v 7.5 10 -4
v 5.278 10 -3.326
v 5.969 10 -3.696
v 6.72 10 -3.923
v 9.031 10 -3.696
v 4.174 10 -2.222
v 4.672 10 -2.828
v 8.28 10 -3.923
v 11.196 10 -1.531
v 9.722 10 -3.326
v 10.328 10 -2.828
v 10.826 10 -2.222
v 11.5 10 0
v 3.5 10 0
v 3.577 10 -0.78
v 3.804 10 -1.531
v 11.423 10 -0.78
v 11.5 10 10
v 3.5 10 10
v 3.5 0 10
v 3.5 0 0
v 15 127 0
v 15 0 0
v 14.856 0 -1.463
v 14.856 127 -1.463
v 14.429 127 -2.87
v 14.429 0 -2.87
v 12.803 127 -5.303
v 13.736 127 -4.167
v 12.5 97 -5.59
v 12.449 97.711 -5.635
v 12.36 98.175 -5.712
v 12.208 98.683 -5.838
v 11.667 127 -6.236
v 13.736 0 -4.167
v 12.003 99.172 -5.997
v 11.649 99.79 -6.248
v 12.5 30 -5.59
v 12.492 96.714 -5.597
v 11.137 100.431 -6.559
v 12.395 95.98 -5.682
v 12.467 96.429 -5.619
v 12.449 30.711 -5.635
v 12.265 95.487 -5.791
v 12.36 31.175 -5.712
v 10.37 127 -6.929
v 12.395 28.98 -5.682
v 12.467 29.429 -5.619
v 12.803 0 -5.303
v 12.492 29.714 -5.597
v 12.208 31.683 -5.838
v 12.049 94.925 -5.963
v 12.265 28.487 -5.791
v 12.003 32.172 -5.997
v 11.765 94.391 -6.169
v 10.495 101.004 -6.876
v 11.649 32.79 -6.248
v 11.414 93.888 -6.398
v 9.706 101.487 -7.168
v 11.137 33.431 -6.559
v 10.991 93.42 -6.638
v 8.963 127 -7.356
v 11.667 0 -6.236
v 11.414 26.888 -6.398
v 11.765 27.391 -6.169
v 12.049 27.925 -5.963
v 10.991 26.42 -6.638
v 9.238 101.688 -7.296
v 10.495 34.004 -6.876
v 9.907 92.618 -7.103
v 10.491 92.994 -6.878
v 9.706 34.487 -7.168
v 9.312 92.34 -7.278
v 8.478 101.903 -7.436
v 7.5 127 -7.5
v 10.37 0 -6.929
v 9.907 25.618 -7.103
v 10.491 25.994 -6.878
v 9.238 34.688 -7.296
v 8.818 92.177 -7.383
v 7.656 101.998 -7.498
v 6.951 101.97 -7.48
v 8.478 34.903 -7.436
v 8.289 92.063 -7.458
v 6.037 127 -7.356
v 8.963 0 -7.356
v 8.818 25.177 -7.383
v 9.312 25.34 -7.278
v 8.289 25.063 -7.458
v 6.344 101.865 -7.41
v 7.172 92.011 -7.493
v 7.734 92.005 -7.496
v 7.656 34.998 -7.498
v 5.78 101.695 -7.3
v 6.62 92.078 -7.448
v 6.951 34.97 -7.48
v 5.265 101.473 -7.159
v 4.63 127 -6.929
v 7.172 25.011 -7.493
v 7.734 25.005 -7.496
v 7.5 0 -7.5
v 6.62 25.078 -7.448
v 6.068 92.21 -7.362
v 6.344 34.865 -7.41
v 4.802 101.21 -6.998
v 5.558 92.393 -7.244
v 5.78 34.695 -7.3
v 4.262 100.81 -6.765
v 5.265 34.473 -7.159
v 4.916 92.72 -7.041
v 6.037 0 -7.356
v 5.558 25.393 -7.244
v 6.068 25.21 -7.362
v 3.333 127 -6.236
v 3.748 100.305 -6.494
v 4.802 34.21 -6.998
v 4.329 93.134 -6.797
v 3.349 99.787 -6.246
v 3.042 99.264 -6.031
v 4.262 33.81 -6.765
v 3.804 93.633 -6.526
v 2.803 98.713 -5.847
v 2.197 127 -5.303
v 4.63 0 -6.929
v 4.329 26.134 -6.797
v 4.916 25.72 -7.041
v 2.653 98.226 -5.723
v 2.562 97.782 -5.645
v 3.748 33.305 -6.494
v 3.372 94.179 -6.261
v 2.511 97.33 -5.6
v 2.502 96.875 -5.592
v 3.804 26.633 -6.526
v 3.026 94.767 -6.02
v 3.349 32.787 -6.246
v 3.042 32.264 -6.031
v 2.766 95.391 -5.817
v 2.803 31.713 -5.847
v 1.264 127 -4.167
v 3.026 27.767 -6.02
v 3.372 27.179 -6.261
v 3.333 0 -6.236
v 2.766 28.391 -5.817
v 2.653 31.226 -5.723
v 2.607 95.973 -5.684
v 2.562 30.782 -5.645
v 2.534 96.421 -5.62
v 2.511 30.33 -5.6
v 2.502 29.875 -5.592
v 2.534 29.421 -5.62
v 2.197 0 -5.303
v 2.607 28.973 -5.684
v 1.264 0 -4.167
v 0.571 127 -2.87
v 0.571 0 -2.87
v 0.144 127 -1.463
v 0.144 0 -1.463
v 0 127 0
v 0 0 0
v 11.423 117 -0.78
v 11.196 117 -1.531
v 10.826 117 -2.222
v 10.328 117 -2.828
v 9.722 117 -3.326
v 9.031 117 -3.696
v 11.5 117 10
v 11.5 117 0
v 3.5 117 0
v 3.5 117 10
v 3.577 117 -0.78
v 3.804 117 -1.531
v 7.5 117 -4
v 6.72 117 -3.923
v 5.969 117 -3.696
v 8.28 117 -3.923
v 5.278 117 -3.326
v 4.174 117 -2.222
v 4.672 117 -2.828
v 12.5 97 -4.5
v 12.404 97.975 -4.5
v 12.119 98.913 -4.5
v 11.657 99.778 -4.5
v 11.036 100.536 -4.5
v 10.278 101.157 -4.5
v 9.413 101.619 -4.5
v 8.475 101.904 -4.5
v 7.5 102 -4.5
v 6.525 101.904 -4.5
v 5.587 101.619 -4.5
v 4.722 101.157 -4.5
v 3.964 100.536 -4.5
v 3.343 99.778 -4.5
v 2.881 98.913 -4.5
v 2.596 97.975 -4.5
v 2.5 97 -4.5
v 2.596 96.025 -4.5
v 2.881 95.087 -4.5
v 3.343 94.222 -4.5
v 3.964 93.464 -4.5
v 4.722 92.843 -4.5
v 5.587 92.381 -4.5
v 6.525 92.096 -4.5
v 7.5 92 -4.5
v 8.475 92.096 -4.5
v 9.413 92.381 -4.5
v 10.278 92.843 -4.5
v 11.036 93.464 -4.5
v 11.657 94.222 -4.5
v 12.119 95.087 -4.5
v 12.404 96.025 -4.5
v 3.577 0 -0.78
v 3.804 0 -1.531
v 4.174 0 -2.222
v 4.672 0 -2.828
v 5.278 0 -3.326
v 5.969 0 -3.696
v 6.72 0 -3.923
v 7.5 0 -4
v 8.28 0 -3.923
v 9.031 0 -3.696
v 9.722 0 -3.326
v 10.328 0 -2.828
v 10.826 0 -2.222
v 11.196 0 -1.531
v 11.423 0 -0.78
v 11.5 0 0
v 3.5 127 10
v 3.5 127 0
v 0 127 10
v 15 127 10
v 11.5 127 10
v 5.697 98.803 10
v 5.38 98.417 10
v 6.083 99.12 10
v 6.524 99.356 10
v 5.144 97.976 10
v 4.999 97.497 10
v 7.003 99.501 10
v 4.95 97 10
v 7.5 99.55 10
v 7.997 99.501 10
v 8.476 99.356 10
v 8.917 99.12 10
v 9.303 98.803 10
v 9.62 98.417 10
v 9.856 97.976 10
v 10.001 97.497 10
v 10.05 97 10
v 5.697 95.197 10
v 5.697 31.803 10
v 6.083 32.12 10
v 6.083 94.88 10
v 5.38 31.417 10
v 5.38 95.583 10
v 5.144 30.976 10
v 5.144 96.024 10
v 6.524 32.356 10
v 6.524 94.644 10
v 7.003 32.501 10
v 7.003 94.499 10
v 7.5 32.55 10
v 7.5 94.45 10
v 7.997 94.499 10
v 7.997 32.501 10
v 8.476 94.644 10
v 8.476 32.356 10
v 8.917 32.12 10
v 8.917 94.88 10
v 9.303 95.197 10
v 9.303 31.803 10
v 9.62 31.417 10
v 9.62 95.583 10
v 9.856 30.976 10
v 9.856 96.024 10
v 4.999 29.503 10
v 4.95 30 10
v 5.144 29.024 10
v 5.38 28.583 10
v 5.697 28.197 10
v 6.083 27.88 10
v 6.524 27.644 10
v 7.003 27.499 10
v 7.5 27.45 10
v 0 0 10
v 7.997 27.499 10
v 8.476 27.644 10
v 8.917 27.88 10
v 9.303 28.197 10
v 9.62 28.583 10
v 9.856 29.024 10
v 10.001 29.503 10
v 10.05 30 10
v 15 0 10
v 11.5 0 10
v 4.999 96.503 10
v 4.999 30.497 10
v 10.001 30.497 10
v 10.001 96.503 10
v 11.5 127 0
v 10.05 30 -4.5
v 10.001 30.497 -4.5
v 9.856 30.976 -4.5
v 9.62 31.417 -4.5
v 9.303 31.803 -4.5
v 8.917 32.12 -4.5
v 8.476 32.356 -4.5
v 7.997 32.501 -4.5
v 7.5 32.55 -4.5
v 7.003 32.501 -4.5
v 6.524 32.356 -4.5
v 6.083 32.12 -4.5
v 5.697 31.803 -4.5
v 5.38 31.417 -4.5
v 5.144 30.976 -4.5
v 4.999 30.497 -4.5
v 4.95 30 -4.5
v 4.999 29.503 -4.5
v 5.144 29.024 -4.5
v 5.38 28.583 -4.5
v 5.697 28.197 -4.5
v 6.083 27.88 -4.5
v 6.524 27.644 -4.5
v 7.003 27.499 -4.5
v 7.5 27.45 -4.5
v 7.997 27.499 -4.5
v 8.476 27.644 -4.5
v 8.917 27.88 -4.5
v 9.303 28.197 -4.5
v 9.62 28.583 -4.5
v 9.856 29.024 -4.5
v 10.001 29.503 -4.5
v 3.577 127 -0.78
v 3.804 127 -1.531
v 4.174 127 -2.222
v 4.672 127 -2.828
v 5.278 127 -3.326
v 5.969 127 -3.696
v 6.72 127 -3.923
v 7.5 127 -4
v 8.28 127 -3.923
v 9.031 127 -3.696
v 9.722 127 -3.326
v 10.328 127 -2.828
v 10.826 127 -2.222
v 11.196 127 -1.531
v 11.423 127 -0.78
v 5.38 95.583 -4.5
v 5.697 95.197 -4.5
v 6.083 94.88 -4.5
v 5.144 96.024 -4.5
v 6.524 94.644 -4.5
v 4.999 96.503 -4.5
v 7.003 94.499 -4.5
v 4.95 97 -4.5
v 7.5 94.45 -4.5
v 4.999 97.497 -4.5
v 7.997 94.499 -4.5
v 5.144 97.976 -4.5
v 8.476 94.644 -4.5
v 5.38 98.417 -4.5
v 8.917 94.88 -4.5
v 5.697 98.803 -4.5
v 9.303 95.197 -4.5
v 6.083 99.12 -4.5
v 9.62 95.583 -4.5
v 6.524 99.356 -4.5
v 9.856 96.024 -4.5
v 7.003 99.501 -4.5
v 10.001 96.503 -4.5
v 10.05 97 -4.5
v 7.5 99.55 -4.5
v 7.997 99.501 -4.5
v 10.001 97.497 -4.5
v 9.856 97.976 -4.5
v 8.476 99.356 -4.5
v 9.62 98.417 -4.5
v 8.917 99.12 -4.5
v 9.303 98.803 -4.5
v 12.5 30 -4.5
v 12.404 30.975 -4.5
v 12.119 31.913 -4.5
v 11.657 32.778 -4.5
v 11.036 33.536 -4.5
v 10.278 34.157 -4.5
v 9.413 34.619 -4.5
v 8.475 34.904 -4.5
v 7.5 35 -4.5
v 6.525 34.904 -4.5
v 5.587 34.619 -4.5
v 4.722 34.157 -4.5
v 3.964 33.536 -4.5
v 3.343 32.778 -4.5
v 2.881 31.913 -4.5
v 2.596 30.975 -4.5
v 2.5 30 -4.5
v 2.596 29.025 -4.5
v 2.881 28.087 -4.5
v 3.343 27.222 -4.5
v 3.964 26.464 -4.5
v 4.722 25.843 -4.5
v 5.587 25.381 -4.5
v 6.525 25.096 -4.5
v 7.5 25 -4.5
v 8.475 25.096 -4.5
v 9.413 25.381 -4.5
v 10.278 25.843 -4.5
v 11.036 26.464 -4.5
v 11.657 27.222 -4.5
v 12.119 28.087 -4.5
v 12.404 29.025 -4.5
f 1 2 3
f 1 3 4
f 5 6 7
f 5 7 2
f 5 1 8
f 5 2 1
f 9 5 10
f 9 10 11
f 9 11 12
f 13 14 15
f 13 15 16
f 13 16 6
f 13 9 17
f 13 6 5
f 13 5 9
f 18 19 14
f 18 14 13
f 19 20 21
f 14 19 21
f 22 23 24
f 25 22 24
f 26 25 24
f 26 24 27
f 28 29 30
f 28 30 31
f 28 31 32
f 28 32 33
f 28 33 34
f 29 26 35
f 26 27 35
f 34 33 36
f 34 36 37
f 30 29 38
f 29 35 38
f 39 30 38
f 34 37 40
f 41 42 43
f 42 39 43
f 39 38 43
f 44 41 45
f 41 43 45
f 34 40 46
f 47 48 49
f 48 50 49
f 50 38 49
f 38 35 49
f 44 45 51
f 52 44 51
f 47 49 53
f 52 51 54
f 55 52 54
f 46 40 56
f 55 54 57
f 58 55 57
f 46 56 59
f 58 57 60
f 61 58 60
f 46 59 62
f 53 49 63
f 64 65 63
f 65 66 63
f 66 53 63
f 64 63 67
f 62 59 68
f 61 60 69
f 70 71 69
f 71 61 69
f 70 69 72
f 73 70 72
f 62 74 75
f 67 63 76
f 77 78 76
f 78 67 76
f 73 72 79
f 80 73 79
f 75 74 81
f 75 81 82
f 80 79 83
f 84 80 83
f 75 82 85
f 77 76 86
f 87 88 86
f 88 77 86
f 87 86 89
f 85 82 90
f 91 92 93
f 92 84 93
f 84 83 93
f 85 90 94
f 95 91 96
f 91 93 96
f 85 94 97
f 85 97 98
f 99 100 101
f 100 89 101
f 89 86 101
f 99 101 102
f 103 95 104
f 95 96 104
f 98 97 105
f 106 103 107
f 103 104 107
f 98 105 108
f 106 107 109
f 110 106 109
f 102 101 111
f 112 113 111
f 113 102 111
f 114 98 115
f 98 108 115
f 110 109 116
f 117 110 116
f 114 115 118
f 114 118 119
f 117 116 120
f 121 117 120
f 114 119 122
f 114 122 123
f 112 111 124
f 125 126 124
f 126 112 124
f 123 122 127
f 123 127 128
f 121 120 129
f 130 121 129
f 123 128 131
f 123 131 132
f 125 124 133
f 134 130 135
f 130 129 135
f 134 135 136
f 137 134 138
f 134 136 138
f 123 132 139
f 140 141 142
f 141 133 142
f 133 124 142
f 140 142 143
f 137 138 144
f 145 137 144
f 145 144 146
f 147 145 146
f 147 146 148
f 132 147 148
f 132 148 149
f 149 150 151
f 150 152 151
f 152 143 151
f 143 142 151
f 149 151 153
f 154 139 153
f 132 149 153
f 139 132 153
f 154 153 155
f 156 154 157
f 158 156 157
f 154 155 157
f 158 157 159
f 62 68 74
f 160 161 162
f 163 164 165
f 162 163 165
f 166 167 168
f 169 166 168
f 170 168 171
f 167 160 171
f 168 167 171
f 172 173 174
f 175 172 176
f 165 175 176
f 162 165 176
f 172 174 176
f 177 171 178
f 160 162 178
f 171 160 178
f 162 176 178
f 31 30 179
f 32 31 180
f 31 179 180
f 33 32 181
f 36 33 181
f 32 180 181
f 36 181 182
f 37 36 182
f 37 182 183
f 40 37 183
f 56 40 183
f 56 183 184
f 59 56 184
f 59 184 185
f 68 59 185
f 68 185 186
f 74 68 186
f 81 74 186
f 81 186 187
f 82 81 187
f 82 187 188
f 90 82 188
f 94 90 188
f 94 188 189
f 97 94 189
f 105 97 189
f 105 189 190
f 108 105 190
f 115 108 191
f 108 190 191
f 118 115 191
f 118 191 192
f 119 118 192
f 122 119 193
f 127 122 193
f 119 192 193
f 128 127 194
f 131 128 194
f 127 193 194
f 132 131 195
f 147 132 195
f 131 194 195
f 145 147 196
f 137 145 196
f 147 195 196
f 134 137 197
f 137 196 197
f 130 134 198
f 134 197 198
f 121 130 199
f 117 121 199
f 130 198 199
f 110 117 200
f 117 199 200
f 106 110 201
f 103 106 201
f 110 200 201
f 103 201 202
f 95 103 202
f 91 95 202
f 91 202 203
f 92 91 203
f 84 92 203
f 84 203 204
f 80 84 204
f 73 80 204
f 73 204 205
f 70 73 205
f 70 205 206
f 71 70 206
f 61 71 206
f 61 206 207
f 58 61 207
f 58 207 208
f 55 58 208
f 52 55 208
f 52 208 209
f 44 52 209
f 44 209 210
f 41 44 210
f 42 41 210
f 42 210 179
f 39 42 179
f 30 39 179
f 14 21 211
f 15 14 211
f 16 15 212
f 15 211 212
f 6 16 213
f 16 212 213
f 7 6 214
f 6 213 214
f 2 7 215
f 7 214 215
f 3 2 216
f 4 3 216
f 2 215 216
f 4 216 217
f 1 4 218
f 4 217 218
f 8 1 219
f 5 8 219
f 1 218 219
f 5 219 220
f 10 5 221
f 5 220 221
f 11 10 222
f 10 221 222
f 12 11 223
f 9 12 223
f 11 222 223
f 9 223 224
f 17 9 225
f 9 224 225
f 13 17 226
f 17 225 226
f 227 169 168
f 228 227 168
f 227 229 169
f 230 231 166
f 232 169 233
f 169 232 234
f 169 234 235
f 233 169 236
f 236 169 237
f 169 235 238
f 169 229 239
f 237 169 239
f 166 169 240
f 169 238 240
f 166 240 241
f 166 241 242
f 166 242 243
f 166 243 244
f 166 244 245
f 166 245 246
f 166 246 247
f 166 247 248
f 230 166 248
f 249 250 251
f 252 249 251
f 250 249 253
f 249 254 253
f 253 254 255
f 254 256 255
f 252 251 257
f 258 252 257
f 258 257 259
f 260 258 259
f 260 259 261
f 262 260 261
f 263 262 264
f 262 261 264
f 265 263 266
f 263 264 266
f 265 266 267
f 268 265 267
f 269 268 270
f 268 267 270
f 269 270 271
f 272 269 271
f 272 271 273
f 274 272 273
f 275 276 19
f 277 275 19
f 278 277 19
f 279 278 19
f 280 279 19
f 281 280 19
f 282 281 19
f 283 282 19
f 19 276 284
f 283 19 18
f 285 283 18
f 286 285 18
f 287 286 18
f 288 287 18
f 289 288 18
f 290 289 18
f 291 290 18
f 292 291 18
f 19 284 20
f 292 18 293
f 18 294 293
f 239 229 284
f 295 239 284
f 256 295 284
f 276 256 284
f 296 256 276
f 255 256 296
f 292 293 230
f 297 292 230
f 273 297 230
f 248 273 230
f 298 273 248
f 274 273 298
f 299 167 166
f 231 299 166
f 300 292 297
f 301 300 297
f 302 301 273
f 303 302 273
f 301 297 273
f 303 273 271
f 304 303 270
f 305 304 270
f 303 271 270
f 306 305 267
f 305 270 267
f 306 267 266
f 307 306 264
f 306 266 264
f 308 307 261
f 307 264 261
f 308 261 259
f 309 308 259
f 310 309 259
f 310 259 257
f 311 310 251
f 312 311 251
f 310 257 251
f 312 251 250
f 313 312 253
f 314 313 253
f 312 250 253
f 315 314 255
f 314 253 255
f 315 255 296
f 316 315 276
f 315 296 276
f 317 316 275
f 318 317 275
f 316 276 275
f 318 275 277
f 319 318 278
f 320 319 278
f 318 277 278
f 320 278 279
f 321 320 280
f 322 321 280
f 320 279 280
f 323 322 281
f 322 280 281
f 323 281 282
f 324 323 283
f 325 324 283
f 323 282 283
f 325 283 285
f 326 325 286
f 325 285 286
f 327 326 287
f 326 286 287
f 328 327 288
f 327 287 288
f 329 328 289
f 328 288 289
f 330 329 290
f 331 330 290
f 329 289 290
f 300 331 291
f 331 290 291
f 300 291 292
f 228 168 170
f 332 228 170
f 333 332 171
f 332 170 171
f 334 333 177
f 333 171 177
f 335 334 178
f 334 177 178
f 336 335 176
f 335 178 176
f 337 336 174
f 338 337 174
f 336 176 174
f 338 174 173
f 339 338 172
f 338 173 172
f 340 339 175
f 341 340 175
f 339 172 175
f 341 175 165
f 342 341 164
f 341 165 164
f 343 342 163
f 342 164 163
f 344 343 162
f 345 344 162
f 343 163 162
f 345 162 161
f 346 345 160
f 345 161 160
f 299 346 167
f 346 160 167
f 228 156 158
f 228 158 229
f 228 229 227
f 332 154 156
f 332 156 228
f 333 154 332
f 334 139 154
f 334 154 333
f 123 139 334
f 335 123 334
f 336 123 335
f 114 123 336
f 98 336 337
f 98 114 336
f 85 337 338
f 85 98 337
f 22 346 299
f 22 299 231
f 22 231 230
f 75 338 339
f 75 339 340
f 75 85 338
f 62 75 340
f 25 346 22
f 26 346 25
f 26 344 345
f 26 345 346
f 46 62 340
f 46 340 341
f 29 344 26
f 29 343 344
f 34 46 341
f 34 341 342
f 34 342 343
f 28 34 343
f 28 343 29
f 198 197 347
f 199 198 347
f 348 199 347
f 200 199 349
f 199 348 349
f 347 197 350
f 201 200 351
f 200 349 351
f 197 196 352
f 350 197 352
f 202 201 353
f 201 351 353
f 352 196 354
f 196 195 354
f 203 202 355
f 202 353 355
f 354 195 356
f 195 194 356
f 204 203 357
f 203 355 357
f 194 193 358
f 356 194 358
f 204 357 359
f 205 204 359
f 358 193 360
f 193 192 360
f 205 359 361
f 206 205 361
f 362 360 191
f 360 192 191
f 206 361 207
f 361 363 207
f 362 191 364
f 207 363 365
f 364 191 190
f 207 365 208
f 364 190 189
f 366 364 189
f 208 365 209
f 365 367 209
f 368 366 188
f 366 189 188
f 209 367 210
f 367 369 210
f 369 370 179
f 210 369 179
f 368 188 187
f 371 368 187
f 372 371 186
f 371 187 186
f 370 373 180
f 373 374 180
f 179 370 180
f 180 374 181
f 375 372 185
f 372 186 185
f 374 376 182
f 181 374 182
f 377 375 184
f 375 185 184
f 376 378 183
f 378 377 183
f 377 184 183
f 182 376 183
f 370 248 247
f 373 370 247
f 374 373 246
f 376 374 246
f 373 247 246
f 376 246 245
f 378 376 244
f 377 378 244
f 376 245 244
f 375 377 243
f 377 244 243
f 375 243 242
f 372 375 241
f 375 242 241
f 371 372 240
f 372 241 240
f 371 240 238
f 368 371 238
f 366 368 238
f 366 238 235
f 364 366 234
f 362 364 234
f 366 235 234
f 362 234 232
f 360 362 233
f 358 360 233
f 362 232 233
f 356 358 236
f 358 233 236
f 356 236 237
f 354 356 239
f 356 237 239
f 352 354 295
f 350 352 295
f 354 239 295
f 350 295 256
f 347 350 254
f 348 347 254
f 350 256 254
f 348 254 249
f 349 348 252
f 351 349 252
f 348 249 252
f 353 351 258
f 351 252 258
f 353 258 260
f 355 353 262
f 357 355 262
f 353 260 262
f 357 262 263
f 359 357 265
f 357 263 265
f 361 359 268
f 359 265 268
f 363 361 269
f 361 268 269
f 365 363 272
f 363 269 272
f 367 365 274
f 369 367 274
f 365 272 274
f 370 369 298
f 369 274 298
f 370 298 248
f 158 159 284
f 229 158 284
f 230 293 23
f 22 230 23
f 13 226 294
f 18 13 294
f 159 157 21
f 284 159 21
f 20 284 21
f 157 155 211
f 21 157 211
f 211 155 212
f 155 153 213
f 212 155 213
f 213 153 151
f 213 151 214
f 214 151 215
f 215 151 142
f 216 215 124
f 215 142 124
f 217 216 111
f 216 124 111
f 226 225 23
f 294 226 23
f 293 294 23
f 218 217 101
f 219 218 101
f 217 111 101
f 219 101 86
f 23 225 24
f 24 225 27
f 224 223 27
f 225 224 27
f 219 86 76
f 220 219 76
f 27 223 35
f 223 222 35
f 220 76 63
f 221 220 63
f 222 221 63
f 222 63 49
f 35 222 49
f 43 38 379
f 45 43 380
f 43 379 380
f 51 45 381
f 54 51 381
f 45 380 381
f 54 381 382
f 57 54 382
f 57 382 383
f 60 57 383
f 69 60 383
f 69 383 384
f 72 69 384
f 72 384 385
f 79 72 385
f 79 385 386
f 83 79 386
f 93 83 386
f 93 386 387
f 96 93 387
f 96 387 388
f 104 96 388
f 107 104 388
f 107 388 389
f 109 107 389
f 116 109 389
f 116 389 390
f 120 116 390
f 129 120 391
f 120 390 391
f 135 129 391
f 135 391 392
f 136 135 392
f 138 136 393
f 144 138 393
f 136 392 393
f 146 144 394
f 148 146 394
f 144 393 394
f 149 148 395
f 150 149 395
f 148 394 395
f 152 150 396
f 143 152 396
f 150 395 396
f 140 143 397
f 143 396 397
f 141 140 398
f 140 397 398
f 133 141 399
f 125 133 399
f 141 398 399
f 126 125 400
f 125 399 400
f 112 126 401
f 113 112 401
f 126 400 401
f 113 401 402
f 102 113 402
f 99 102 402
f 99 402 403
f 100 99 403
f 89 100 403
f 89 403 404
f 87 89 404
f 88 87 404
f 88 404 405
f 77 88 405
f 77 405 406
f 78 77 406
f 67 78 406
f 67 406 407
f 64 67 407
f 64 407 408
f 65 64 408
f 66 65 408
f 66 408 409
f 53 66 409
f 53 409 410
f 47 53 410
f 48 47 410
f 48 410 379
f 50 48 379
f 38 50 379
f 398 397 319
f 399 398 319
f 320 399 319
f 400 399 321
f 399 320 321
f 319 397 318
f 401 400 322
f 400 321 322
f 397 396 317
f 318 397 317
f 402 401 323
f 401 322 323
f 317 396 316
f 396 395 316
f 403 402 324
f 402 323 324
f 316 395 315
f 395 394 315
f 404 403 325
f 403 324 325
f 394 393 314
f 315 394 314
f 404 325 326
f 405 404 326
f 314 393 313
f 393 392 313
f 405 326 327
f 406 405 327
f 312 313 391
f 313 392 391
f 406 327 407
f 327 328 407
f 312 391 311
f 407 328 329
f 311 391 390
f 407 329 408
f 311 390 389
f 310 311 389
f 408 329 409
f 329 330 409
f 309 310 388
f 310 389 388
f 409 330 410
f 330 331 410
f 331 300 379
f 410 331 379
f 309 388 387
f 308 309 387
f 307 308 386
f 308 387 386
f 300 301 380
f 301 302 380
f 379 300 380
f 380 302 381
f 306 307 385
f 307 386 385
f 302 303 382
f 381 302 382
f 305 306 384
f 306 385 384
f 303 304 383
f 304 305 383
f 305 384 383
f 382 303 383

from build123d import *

# Parameters (mm, degrees)
EXTRUDE_1_DEPTH     = 127
SKETCH_6_R          = 2.55
CUT_EXTRUDE_1_DEPTH = 14.5
SKETCH_7_R          = 5
CUT_EXTRUDE_2_DEPTH = 14.5
CUT_EXTRUDE_3_DEPTH = 10
SKETCH_9_R          = 2.55
CUT_EXTRUDE_4_DEPTH = 14.5
SKETCH_10_R         = 5
CUT_EXTRUDE_5_DEPTH = 14.5
CUT_EXTRUDE_START   = -10
CUT_EXTRUDE_6_DEPTH = 10


with BuildPart() as part:
    # Эскиз2 → Бобышка-Вытянуть1 (new body)
    with BuildSketch(Plane(origin=(0, 0, 0), x_dir=(1, 0, 0), z_dir=(0, 1, 0))):
        with BuildLine():
            Line((0, 0), (0, -10))
            Line((0, -10), (15, -10))
            Line((15, -10), (15, 0))
            ThreePointArc((15, 0), (7.5, 7.5), (0, 0))
        make_face()
    extrude(amount=EXTRUDE_1_DEPTH)

    # Эскиз6 → Вырез-Вытянуть1 (cut)
    with BuildSketch(Plane.XY.offset(10)):
        with Locations((7.5, 30)):
            Circle(SKETCH_6_R)
    extrude(amount=-CUT_EXTRUDE_1_DEPTH, mode=Mode.SUBTRACT)

    # Эскиз7 → Вырез-Вытянуть2 (cut)
    with BuildSketch(Plane.XY.offset(-4.5)):
        with Locations((7.5, 30)):
            Circle(SKETCH_7_R)
    extrude(amount=-CUT_EXTRUDE_2_DEPTH, mode=Mode.SUBTRACT)

    # Эскиз8 → Вырез-Вытянуть3 (cut)
    with BuildSketch(Plane.XZ):
        with BuildLine():
            Line((11.5, 0), (11.5, 10))
            Line((11.5, 10), (3.5, 10))
            Line((3.5, 10), (3.5, 0))
            ThreePointArc((3.5, 0), (7.5, -4), (11.5, 0))
        make_face()
    extrude(amount=-CUT_EXTRUDE_3_DEPTH, mode=Mode.SUBTRACT)

    # Эскиз9 → Вырез-Вытянуть4 (cut)
    with BuildSketch(Plane.XY.offset(10)):
        with Locations((7.5, 97)):
            Circle(SKETCH_9_R)
    extrude(amount=-CUT_EXTRUDE_4_DEPTH, mode=Mode.SUBTRACT)

    # Эскиз10 → Вырез-Вытянуть5 (cut)
    with BuildSketch(Plane.XY.offset(-4.5)):
        with Locations((7.5, 97)):
            Circle(SKETCH_10_R)
    extrude(amount=-CUT_EXTRUDE_5_DEPTH, mode=Mode.SUBTRACT)

    # Эскиз11 → Вырез-Вытянуть6 (cut)
    with BuildSketch(Plane(origin=(0, 127, 0), x_dir=(1, 0, 0), z_dir=(0, 1, 0)).offset(CUT_EXTRUDE_START)):
        with BuildLine():
            Line((11.5, 0), (11.5, -10))
            Line((11.5, -10), (3.5, -10))
            Line((3.5, -10), (3.5, 0))
            ThreePointArc((3.5, 0), (7.5, 4), (11.5, 0))
        make_face()
    extrude(amount=CUT_EXTRUDE_6_DEPTH, mode=Mode.SUBTRACT)


solid = part.part
